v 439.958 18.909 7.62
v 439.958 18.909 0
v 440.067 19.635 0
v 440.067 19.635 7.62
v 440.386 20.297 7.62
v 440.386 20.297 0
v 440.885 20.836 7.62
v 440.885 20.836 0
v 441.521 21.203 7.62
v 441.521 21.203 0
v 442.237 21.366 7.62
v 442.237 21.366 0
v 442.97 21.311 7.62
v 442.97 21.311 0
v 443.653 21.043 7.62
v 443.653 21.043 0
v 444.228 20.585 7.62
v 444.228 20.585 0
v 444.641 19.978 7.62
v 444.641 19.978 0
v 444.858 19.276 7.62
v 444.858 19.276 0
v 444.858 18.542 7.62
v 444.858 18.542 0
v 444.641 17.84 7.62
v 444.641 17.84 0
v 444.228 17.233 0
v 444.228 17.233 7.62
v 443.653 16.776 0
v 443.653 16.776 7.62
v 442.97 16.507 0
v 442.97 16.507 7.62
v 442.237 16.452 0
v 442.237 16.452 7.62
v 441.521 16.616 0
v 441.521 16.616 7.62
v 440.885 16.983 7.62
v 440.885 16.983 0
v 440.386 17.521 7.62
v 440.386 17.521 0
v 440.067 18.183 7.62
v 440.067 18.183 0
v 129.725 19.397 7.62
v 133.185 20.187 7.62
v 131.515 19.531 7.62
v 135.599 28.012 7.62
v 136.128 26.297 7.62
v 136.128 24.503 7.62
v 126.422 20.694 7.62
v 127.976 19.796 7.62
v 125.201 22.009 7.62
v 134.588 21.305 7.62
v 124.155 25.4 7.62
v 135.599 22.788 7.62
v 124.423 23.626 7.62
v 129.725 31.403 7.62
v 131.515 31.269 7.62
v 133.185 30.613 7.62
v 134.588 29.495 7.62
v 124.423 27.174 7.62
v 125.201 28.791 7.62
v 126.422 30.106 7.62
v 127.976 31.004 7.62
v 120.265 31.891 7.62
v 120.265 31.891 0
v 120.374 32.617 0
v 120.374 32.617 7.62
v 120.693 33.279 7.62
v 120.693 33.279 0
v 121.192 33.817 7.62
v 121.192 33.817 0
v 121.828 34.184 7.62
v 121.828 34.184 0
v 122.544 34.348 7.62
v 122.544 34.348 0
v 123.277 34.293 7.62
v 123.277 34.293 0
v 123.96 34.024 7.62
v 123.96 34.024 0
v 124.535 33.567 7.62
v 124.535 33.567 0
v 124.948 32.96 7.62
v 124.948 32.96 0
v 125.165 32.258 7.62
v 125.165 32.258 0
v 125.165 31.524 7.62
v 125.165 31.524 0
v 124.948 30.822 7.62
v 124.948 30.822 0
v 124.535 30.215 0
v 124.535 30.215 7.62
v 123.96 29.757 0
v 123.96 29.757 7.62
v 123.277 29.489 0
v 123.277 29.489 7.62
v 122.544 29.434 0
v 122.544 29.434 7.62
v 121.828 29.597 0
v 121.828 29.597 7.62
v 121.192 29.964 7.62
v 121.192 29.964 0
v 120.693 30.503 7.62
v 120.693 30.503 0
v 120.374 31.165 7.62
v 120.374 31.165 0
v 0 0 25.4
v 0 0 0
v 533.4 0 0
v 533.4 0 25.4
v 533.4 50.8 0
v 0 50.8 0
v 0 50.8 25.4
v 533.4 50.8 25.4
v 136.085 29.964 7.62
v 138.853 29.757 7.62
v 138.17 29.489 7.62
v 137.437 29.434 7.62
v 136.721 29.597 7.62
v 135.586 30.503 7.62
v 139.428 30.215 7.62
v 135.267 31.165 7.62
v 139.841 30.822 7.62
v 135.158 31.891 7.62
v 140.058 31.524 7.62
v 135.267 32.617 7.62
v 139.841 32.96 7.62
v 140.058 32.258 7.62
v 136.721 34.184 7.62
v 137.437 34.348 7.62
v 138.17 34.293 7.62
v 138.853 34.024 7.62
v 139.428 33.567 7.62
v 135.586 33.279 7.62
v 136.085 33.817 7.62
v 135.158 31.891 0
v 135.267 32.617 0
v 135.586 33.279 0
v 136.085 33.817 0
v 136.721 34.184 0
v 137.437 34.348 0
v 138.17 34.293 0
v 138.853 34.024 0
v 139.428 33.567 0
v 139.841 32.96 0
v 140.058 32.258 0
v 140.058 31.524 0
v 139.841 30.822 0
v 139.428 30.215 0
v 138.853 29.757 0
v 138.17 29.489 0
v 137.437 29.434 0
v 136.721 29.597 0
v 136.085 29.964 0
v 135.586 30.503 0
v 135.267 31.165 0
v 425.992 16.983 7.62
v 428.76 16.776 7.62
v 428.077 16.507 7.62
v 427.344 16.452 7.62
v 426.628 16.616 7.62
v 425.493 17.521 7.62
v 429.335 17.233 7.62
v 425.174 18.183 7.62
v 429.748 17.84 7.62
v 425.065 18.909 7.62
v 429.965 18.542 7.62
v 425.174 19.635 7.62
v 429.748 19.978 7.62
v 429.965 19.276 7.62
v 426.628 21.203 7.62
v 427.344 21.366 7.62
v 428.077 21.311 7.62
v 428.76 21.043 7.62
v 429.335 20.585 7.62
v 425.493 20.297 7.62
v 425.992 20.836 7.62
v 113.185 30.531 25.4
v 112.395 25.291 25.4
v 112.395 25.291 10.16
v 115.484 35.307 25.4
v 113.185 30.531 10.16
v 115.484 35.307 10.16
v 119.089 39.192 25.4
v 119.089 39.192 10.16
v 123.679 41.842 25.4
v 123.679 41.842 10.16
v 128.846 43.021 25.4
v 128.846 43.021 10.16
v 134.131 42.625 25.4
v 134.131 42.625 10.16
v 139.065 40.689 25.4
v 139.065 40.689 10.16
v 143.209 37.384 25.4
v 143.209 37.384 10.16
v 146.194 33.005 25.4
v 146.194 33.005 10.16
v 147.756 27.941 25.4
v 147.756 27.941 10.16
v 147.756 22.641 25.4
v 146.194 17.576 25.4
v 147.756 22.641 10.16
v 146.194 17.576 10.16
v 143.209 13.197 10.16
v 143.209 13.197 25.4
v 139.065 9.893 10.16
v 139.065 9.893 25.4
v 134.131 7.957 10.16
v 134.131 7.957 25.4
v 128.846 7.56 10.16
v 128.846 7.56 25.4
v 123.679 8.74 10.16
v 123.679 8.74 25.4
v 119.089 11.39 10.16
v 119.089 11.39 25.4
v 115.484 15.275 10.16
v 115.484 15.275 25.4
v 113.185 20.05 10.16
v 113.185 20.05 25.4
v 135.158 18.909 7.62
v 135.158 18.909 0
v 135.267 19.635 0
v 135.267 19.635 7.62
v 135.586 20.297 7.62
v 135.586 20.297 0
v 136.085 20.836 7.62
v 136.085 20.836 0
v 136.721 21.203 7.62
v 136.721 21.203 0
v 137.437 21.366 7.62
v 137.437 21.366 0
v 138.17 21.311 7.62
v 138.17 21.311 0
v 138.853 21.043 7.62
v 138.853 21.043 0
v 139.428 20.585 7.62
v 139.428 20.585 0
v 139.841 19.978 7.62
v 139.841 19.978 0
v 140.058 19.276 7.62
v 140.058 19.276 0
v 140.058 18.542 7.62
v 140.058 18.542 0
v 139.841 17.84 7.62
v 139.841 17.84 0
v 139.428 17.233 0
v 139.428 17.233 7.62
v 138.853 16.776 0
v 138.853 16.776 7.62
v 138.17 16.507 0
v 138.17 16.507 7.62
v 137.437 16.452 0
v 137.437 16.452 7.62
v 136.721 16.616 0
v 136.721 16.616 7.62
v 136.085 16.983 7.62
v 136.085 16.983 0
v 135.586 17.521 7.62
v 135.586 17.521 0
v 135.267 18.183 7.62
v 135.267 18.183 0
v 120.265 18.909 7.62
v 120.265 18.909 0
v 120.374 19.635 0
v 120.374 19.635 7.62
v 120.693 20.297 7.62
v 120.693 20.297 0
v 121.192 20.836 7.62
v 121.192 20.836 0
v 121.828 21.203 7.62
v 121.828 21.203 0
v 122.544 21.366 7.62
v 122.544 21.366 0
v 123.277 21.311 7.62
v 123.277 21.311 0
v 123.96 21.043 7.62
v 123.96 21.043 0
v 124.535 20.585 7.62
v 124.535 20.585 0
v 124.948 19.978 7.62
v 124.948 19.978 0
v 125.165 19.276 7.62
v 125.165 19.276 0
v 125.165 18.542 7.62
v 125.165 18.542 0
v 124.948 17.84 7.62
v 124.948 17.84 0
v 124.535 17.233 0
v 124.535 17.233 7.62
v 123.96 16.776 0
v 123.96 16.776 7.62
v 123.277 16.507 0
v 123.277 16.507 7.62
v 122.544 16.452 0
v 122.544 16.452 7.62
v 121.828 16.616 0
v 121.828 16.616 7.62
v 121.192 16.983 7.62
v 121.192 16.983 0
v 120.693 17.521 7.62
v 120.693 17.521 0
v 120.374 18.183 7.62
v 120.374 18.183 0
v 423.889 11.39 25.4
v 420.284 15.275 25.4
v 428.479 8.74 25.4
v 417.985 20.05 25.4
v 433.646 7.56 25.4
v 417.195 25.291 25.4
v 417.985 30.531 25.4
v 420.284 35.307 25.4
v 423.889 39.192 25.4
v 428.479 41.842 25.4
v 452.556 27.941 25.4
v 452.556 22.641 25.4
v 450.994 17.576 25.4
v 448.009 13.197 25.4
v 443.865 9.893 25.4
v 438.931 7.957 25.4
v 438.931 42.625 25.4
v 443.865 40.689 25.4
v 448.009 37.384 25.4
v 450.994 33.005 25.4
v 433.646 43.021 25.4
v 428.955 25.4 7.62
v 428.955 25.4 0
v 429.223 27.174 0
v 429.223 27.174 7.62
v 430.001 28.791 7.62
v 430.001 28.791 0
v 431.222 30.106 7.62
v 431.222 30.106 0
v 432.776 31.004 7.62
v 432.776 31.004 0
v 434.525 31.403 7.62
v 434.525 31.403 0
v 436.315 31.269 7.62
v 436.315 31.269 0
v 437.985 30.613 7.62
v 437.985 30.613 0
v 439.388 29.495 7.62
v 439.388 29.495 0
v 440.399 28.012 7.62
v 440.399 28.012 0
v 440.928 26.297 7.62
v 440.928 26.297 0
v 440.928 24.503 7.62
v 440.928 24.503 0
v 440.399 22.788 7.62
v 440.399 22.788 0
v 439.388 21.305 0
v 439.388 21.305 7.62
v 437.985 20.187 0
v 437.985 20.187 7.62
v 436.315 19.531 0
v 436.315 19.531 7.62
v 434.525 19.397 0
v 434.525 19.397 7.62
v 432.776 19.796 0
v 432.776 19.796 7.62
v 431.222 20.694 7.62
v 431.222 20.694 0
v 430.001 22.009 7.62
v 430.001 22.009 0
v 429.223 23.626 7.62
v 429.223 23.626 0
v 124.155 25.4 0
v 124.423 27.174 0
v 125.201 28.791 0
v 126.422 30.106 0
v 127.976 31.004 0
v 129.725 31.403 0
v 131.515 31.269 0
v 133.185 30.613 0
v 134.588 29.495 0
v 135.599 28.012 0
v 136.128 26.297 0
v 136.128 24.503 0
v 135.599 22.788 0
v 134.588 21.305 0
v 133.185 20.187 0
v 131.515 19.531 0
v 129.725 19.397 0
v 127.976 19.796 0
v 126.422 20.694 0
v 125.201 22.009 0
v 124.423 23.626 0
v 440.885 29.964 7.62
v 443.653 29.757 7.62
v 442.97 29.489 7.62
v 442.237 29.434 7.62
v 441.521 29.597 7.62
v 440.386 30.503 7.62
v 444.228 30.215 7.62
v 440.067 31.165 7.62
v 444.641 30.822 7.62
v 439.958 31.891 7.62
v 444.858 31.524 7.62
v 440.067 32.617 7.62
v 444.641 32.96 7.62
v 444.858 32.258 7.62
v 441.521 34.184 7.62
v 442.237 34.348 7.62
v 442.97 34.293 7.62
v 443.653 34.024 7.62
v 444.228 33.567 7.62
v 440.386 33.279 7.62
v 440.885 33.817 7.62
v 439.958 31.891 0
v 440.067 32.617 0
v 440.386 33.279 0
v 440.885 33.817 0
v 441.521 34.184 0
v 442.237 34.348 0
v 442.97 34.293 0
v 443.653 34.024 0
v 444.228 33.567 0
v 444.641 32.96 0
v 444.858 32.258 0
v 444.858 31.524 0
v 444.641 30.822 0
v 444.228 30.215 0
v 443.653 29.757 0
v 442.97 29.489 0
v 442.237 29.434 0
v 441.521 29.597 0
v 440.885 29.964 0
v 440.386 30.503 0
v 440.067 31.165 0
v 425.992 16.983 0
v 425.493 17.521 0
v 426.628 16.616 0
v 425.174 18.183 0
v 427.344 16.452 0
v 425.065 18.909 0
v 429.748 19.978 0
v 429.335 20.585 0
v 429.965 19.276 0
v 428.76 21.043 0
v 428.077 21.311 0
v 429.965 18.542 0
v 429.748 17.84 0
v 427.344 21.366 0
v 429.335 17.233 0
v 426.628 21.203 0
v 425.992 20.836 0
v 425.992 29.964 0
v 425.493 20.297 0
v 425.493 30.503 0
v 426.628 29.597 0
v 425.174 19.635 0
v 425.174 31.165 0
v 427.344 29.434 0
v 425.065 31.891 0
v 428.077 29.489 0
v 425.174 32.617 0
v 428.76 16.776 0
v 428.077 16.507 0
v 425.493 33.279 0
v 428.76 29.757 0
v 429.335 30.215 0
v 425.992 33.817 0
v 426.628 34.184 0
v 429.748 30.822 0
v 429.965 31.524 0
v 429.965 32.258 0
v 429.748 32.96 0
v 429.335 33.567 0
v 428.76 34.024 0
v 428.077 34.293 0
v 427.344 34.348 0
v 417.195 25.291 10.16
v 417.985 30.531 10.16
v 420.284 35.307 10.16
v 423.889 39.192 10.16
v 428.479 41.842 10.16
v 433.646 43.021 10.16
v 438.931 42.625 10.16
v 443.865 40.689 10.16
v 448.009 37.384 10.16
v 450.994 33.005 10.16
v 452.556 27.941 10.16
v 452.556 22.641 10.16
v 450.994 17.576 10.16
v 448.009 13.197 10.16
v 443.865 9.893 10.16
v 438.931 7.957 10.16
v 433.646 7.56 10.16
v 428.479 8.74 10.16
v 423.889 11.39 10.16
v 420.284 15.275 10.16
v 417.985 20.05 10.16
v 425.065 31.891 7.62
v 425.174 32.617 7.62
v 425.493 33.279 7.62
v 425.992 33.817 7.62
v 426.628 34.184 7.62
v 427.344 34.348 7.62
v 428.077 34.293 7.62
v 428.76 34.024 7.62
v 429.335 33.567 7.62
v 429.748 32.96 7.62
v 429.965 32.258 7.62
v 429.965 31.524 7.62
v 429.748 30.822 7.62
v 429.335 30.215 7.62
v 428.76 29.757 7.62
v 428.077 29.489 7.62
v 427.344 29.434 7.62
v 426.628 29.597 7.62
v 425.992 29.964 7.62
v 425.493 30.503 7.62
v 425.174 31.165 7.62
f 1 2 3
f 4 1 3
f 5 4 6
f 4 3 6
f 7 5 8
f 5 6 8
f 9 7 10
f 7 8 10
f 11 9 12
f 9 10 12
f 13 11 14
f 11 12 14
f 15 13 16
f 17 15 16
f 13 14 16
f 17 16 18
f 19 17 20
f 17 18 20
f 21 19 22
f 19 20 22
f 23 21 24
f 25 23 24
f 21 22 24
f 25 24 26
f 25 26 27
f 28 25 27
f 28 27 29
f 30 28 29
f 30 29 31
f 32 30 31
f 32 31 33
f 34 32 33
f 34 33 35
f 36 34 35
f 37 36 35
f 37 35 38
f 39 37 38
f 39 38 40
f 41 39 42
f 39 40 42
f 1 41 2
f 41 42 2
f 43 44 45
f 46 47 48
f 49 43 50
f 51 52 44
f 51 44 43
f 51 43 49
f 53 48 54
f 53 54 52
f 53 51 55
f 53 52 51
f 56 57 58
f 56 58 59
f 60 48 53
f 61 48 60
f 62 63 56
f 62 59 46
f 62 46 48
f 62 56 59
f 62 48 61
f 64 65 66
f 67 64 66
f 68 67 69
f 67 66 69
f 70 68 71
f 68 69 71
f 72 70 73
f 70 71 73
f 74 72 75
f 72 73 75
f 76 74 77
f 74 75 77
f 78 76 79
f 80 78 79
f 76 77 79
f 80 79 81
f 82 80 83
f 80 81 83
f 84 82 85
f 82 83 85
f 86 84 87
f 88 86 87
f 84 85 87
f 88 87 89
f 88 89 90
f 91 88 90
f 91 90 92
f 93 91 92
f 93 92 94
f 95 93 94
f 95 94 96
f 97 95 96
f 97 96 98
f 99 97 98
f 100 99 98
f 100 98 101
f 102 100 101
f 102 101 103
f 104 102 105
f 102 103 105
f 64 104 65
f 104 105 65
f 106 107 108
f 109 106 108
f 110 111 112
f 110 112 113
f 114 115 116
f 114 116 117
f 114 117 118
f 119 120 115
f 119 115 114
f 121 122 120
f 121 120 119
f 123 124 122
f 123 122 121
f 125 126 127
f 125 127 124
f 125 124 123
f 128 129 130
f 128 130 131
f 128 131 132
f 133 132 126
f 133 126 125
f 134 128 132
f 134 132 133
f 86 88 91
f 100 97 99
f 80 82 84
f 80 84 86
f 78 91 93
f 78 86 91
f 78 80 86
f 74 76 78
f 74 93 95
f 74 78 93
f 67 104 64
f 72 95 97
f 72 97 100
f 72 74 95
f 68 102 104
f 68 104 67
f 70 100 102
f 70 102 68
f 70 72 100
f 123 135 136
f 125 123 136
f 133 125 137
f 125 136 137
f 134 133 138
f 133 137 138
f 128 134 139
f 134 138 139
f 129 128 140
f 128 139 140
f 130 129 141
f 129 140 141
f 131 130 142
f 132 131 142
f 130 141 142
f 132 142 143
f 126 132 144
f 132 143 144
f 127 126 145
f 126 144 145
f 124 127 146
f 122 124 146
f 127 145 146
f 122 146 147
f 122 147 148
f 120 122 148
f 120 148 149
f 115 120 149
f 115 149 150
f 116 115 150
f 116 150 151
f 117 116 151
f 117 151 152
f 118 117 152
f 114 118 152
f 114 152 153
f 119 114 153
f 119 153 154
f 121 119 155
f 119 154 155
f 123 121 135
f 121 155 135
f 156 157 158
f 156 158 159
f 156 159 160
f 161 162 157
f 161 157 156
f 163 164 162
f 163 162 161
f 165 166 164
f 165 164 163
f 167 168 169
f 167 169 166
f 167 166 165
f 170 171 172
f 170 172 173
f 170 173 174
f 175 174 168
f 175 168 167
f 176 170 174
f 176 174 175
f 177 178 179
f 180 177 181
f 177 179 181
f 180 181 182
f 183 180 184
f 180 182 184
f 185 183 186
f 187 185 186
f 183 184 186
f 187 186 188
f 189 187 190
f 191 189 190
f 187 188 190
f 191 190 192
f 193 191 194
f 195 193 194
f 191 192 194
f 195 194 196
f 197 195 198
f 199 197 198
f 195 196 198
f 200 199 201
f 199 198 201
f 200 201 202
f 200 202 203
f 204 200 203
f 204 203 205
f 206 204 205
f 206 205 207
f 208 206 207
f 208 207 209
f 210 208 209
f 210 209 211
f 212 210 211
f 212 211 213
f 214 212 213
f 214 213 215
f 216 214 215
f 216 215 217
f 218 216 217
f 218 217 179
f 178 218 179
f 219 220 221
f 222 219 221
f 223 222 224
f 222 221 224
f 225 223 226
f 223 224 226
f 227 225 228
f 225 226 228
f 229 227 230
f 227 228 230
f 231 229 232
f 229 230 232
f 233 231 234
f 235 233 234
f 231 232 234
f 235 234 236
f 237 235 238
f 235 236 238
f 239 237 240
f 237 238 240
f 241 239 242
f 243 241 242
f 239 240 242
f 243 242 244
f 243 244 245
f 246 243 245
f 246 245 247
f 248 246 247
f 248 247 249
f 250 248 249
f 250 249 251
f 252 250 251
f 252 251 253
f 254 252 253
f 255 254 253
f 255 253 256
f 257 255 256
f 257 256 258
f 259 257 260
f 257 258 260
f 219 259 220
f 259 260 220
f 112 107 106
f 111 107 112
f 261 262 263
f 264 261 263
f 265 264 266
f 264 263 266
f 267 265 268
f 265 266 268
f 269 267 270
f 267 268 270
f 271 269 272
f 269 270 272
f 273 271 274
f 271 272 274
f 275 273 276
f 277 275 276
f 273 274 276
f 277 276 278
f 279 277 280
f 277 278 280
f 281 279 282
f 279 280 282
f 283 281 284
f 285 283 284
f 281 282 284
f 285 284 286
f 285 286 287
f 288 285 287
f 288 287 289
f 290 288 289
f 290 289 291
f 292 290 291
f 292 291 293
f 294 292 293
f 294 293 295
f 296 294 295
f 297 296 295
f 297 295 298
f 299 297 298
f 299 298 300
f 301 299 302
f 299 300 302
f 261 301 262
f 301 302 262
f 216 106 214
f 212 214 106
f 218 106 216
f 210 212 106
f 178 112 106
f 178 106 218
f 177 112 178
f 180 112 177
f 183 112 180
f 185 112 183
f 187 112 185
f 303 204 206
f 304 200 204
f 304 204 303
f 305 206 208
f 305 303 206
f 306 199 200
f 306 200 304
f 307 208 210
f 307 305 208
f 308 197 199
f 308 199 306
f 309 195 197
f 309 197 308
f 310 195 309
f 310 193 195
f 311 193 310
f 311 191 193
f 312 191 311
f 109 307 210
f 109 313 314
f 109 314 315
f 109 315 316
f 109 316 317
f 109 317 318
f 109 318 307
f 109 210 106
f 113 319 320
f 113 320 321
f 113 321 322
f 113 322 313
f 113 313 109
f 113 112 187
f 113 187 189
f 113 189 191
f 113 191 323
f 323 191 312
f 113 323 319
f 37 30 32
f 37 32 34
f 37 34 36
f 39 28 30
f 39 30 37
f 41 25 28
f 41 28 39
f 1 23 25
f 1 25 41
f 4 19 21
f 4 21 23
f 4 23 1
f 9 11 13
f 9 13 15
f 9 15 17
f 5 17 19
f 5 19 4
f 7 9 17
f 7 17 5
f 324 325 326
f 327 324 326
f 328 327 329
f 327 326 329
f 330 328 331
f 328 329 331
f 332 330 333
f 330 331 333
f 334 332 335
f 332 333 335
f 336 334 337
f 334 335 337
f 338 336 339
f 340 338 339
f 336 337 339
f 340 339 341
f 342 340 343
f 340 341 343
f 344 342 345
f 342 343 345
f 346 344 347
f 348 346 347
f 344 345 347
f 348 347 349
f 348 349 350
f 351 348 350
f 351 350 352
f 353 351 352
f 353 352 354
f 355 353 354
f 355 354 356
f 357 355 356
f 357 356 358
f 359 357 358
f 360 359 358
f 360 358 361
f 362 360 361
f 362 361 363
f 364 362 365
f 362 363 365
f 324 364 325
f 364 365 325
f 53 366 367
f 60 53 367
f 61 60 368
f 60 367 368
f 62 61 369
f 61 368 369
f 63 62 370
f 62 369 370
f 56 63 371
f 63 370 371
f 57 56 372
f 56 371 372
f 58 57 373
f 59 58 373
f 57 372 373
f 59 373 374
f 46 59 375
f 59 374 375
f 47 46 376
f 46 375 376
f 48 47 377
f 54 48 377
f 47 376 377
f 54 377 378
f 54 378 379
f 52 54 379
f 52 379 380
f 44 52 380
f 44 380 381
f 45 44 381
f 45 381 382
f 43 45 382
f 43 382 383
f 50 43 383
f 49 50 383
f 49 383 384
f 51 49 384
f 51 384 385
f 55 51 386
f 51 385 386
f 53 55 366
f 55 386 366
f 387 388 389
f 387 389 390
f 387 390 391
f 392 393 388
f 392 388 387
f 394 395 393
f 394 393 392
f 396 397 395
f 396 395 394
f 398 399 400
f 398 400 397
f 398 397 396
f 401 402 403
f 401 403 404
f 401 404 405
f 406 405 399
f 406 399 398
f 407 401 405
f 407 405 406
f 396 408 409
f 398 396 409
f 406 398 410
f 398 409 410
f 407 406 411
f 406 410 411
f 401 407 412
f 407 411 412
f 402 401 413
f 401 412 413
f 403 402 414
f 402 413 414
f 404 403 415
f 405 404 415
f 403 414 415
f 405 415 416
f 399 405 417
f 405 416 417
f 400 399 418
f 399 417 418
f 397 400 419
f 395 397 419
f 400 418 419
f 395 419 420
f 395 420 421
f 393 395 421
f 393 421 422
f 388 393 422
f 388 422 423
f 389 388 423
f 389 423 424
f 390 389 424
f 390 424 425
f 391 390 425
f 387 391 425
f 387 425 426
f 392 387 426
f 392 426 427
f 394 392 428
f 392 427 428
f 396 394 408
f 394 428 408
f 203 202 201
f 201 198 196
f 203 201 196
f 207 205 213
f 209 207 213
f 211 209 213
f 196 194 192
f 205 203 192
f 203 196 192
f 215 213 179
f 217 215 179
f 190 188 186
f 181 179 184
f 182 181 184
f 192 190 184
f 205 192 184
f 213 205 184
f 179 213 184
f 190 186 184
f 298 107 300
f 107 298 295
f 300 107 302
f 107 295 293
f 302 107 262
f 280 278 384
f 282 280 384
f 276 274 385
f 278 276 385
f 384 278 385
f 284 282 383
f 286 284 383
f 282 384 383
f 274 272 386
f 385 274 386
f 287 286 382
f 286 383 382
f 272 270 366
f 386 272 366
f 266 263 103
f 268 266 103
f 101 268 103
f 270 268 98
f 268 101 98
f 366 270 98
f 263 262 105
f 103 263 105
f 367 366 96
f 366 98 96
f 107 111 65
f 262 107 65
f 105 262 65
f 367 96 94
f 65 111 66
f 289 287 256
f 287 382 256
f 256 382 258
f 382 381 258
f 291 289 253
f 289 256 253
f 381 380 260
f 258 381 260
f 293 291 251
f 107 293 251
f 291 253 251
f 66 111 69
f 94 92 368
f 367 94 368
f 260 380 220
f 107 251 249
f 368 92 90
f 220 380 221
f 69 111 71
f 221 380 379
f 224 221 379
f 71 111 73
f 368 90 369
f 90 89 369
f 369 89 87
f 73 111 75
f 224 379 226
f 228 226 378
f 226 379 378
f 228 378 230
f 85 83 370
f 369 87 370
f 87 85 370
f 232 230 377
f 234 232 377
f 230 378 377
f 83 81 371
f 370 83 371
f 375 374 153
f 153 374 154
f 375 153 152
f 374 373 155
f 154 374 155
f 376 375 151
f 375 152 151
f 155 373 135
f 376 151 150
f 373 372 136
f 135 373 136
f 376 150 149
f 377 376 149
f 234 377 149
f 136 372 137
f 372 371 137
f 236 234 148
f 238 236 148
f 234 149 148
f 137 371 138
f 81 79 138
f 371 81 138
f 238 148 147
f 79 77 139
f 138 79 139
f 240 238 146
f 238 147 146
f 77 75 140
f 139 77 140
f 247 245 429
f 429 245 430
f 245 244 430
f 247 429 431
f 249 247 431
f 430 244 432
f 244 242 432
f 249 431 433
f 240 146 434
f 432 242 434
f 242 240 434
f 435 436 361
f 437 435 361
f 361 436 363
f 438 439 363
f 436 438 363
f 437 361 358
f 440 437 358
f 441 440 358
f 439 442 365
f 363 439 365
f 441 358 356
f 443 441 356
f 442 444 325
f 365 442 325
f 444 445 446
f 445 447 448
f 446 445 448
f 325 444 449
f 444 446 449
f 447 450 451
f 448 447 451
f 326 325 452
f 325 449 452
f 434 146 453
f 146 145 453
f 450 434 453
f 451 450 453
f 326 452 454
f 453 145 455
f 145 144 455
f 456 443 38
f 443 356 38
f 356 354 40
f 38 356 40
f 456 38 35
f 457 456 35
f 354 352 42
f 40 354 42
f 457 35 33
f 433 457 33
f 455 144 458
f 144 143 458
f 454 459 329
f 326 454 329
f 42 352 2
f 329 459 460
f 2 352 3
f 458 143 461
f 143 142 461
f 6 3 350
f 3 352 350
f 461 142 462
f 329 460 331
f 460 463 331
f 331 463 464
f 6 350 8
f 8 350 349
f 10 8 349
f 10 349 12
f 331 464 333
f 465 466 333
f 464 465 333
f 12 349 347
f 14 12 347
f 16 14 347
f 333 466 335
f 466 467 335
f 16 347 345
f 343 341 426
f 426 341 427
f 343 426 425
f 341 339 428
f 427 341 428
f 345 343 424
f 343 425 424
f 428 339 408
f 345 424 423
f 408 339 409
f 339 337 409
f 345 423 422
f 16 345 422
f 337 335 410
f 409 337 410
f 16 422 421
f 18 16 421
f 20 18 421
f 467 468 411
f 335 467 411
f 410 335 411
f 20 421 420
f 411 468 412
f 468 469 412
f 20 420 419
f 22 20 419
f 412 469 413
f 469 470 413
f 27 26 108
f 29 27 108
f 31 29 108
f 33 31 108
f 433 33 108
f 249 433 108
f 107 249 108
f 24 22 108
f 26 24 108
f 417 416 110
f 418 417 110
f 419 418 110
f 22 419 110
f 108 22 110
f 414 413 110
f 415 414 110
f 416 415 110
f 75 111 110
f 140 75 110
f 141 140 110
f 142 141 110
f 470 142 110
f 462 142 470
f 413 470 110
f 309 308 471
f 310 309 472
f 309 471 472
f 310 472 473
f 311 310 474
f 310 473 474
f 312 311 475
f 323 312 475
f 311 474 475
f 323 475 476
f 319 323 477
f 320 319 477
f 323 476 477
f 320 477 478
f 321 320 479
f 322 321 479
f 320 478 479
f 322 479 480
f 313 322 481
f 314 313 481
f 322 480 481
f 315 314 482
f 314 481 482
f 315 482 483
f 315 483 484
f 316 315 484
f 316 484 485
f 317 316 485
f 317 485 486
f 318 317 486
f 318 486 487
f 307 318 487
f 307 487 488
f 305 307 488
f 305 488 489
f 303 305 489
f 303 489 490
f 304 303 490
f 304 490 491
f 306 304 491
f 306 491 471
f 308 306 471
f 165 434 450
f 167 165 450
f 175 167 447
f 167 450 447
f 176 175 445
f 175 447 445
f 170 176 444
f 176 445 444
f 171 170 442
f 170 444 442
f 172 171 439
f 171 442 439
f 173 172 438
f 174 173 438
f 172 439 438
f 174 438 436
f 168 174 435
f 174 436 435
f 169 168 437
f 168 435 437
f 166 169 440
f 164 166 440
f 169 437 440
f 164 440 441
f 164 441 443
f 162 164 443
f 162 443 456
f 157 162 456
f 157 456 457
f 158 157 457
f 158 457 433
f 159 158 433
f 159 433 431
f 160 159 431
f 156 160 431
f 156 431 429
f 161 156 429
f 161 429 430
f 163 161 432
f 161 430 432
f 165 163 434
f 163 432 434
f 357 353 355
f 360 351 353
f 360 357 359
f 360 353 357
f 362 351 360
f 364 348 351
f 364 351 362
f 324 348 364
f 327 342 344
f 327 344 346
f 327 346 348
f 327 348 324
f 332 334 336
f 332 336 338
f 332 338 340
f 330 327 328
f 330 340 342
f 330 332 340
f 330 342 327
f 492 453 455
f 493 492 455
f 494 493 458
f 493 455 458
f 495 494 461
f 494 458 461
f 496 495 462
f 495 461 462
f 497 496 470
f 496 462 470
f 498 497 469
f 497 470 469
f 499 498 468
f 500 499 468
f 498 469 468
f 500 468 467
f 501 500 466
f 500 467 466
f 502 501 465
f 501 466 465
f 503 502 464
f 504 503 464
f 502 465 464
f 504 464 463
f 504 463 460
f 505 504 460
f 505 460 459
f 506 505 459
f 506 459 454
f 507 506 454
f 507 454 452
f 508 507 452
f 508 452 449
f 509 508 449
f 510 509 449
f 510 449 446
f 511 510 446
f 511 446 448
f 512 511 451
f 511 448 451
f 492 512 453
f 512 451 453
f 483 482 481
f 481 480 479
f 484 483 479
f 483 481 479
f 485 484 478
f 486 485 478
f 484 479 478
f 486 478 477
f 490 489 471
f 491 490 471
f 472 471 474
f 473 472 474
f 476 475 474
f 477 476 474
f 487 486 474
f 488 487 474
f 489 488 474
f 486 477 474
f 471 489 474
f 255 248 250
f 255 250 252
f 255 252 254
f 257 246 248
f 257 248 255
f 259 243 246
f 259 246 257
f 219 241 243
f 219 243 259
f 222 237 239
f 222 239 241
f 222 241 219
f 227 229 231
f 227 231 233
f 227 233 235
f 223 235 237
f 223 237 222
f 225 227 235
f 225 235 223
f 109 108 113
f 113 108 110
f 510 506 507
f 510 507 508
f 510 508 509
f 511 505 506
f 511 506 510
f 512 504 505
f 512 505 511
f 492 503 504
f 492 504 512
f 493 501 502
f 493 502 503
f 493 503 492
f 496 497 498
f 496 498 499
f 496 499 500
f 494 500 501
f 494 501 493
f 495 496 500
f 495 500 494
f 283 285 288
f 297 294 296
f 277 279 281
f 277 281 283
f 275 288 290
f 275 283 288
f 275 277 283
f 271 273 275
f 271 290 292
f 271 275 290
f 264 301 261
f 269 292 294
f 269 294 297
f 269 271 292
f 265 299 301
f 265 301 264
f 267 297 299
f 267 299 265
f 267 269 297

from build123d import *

# Parameters (mm, degrees)
SKETCH1_W           = 533.4
SKETCH1_H           = 50.8
BOSS_EXTRUDE1_DEPTH = 25.4
CUT_EXTRUDE1_START  = -10.16
SKETCH3_R           = 17.78
CUT_EXTRUDE1_DEPTH  = 127
SKETCH4_R           = 6.0198
SKETCH4_R_2         = 2.4638
CUT_EXTRUDE2_DEPTH  = 7.62


with BuildPart() as part:
    # Sketch1 → Boss-Extrude1 (new body)
    with BuildSketch(Plane.XY):
        with Locations((266.7, 25.4)):
            Rectangle(SKETCH1_W, SKETCH1_H)
    extrude(amount=BOSS_EXTRUDE1_DEPTH)

    # Sketch3 → Cut-Extrude1 (cut)
    with BuildSketch(Plane(origin=(0, 0, 0), x_dir=(-1, 0, 0), z_dir=(0, 0, -1)).offset(CUT_EXTRUDE1_START)):
        with Locations((-130.175, 25.290721308)):
            Circle(SKETCH3_R)
        with Locations((-434.975, 25.290721308)):
            Circle(SKETCH3_R)
    extrude(amount=-CUT_EXTRUDE1_DEPTH, mode=Mode.SUBTRACT)

    # Sketch4 → Cut-Extrude2 (cut)
    with BuildSketch(Plane(origin=(0, 0, 0), x_dir=(-1, 0, 0), z_dir=(0, 0, -1))):
        with Locations((-130.175, 25.4)):
            Circle(SKETCH4_R)
        with Locations((-122.728486169, 18.909255319)):
            Circle(SKETCH4_R_2)
        with Locations((-122.728486169, 31.890744681)):
            Circle(SKETCH4_R_2)
        with Locations((-137.621513831, 18.909255319)):
            Circle(SKETCH4_R_2)
        with Locations((-137.621513831, 31.890744681)):
            Circle(SKETCH4_R_2)
        with Locations((-434.975, 25.4)):
            Circle(SKETCH4_R)
        with Locations((-427.528486169, 18.909255319)):
            Circle(SKETCH4_R_2)
        with Locations((-427.528486169, 31.890744681)):
            Circle(SKETCH4_R_2)
        with Locations((-442.421513831, 18.909255319)):
            Circle(SKETCH4_R_2)
        with Locations((-442.421513831, 31.890744681)):
            Circle(SKETCH4_R_2)
    extrude(amount=-CUT_EXTRUDE2_DEPTH, mode=Mode.SUBTRACT)


solid = part.part
